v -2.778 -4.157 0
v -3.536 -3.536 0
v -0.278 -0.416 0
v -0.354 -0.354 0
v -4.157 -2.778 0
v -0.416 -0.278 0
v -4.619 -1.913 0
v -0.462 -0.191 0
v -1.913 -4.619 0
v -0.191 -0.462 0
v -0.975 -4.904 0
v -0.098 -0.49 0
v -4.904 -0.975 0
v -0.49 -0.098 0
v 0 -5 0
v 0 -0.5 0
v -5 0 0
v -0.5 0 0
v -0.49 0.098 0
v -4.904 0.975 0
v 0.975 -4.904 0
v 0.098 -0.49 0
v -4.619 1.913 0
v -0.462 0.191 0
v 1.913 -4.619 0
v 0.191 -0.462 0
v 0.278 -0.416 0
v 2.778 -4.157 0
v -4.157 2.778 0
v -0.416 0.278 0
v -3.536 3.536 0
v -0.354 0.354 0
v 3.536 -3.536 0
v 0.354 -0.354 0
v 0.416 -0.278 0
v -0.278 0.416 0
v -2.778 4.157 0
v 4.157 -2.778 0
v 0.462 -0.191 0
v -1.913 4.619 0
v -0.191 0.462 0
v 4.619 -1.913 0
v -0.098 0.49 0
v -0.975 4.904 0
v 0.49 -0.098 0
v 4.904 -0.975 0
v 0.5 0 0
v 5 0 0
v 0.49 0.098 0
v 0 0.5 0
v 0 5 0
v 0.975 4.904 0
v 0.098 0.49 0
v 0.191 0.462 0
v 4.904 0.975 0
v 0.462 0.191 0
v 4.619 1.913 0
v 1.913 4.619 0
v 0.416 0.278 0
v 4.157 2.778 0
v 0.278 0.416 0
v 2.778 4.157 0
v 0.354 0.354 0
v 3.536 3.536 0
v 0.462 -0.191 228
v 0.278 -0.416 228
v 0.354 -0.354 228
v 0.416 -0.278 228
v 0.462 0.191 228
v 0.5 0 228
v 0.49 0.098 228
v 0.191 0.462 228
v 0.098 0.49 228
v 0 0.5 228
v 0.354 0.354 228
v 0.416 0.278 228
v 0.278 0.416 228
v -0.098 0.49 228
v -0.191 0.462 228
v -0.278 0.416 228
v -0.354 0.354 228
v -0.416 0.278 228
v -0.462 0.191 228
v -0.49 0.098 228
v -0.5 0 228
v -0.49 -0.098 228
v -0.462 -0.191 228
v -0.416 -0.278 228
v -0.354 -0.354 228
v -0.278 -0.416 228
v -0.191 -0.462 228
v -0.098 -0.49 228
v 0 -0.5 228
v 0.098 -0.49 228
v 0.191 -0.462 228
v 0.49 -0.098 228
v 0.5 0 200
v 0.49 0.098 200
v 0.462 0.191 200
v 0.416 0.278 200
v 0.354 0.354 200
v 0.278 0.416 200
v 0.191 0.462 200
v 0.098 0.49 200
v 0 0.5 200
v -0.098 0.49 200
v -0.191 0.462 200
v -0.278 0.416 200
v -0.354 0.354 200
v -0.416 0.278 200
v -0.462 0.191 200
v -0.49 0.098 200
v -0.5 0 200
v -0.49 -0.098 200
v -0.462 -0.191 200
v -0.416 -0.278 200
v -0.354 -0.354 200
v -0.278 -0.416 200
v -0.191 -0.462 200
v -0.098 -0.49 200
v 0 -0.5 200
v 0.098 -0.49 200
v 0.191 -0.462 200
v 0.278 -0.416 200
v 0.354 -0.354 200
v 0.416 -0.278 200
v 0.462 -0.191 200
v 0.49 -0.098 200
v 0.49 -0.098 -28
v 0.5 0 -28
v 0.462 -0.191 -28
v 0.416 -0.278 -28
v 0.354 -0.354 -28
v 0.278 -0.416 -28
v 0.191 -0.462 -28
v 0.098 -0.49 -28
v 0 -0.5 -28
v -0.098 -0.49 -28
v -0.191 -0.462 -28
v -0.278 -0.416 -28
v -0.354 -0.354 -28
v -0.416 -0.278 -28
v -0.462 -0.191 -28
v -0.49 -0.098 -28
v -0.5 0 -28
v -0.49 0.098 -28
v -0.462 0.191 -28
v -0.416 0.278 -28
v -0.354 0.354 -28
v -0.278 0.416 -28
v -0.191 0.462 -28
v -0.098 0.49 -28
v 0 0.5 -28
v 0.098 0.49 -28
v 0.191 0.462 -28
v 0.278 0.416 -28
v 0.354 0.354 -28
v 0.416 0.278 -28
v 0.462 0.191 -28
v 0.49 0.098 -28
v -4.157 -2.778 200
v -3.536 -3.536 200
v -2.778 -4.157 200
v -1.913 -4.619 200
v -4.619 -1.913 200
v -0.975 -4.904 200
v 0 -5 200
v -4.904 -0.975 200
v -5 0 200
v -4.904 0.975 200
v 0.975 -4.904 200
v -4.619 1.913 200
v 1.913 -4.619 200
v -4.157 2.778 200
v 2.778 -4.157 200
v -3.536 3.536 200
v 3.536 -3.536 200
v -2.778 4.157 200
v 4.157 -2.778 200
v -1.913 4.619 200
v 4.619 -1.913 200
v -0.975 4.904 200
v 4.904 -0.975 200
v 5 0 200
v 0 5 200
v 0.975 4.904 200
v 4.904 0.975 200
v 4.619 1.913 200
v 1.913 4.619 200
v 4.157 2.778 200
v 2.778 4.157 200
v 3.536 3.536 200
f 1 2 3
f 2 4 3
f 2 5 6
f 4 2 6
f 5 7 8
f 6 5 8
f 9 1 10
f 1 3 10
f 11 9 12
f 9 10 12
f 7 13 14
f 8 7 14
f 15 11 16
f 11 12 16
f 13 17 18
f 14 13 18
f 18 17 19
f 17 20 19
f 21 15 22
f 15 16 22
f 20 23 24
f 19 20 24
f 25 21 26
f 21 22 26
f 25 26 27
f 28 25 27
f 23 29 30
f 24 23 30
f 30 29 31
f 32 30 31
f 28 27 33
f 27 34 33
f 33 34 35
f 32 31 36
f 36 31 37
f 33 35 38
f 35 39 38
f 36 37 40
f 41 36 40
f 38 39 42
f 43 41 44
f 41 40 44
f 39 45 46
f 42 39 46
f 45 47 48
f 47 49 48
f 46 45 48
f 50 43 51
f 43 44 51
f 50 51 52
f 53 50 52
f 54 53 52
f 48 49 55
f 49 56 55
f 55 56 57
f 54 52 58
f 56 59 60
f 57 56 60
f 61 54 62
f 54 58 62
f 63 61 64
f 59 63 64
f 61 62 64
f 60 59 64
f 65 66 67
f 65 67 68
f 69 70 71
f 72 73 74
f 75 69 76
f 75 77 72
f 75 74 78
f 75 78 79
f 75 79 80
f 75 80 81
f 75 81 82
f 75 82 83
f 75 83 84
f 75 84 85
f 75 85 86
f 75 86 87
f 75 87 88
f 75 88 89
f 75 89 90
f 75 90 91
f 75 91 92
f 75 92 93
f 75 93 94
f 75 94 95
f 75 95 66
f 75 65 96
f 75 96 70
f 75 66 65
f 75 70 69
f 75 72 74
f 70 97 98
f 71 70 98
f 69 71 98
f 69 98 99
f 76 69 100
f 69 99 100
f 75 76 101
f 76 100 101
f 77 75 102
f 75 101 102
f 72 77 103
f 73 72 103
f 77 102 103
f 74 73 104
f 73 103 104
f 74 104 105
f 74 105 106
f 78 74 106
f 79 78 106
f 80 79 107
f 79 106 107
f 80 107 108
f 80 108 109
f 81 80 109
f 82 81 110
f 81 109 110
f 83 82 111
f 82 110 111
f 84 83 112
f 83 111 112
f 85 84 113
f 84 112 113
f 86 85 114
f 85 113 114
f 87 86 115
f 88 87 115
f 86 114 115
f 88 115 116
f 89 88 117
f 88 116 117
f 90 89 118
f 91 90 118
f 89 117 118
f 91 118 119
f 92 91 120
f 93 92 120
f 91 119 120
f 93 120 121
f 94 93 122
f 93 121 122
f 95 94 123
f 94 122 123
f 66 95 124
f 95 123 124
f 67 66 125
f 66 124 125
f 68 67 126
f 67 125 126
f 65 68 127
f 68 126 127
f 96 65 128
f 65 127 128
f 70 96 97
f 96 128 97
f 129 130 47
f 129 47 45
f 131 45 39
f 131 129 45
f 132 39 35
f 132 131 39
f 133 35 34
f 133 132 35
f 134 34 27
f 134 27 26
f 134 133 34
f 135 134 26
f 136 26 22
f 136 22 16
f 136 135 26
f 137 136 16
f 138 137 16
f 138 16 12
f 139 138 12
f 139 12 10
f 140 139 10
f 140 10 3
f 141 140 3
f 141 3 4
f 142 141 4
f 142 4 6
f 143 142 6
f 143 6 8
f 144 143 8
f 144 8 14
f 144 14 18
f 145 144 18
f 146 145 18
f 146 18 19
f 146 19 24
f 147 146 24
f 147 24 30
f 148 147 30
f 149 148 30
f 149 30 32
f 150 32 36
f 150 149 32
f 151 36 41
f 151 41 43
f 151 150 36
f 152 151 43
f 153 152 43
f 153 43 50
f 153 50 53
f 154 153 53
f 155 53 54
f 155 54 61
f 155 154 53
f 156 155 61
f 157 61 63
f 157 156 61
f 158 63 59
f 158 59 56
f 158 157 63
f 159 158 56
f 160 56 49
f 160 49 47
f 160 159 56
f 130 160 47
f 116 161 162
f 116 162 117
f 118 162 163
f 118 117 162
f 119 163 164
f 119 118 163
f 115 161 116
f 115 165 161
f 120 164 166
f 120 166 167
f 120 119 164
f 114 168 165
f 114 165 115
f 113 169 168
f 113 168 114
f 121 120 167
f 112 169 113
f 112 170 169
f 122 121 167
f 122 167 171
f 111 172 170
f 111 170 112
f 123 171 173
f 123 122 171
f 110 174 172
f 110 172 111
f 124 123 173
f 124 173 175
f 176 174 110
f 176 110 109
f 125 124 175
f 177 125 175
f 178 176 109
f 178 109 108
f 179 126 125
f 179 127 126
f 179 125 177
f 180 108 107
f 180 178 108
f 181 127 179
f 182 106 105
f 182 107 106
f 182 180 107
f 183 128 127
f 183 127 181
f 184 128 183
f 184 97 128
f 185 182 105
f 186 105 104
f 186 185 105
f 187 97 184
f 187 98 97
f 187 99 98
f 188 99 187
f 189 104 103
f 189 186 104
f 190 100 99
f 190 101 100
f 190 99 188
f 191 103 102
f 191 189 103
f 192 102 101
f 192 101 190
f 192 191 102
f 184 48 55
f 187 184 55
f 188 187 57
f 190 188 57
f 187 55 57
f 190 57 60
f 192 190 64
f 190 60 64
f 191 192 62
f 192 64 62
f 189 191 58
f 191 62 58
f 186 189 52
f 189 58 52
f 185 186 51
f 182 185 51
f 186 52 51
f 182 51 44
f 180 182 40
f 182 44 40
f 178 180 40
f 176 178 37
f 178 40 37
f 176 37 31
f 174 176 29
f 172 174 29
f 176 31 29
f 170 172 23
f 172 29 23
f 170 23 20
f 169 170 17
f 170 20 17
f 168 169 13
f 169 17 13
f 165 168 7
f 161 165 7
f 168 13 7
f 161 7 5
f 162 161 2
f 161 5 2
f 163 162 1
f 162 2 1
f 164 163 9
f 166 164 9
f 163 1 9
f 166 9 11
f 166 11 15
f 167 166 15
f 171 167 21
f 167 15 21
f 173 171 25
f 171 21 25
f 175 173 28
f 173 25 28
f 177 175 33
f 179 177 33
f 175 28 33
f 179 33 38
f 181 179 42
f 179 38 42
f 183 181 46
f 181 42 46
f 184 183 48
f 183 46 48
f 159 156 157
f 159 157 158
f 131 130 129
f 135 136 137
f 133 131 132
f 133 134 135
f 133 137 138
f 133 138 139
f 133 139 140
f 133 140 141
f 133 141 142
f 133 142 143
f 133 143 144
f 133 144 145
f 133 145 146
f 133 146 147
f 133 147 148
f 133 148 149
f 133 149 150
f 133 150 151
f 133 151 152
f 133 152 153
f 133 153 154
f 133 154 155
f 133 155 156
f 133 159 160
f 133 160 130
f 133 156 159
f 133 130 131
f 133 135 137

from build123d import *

# Parameters (mm, degrees)
SKETCH_7_R          = 5
EXTRUDE_4_DEPTH     = 200
SKETCH_8_R          = 0.5
EXTRUDE_5_DEPTH     = 28
EXTRUDE_START       = 84
SKETCH_9_R          = 0.5
EXTRUDE_6_DEPTH     = 84
SKETCH_10_R         = 0.5
CUT_EXTRUDE_1_DEPTH = 56


with BuildPart() as part:
    # 草图7 → 凸台-拉伸4 (new body)
    with BuildSketch(Plane.XY):
        Circle(SKETCH_7_R)
    extrude(amount=EXTRUDE_4_DEPTH)

    # 草图8 → 凸台-拉伸5 (add)
    with BuildSketch(Plane.XY.offset(200)):
        Circle(SKETCH_8_R)
    extrude(amount=EXTRUDE_5_DEPTH)

    # 草图9 → 凸台-拉伸6 (add)
    with BuildSketch(Plane(origin=(0, 0, 0), x_dir=(-1, 0, 0), z_dir=(0, 0, -1)).offset(EXTRUDE_START)):
        with Locations(Location((0, 0, 0), (0, 0, 180))):
            Circle(SKETCH_9_R)
    extrude(amount=-EXTRUDE_6_DEPTH)

    # 草图10 → 切除-拉伸1 (cut)
    with BuildSketch(Plane(origin=(0, 0, -84), x_dir=(-1, 0, 0), z_dir=(0, 0, -1))):
        with Locations(Location((0, 0, 0), (0, 0, 180))):
            Circle(SKETCH_10_R)
    extrude(amount=-CUT_EXTRUDE_1_DEPTH, mode=Mode.SUBTRACT)


solid = part.part
